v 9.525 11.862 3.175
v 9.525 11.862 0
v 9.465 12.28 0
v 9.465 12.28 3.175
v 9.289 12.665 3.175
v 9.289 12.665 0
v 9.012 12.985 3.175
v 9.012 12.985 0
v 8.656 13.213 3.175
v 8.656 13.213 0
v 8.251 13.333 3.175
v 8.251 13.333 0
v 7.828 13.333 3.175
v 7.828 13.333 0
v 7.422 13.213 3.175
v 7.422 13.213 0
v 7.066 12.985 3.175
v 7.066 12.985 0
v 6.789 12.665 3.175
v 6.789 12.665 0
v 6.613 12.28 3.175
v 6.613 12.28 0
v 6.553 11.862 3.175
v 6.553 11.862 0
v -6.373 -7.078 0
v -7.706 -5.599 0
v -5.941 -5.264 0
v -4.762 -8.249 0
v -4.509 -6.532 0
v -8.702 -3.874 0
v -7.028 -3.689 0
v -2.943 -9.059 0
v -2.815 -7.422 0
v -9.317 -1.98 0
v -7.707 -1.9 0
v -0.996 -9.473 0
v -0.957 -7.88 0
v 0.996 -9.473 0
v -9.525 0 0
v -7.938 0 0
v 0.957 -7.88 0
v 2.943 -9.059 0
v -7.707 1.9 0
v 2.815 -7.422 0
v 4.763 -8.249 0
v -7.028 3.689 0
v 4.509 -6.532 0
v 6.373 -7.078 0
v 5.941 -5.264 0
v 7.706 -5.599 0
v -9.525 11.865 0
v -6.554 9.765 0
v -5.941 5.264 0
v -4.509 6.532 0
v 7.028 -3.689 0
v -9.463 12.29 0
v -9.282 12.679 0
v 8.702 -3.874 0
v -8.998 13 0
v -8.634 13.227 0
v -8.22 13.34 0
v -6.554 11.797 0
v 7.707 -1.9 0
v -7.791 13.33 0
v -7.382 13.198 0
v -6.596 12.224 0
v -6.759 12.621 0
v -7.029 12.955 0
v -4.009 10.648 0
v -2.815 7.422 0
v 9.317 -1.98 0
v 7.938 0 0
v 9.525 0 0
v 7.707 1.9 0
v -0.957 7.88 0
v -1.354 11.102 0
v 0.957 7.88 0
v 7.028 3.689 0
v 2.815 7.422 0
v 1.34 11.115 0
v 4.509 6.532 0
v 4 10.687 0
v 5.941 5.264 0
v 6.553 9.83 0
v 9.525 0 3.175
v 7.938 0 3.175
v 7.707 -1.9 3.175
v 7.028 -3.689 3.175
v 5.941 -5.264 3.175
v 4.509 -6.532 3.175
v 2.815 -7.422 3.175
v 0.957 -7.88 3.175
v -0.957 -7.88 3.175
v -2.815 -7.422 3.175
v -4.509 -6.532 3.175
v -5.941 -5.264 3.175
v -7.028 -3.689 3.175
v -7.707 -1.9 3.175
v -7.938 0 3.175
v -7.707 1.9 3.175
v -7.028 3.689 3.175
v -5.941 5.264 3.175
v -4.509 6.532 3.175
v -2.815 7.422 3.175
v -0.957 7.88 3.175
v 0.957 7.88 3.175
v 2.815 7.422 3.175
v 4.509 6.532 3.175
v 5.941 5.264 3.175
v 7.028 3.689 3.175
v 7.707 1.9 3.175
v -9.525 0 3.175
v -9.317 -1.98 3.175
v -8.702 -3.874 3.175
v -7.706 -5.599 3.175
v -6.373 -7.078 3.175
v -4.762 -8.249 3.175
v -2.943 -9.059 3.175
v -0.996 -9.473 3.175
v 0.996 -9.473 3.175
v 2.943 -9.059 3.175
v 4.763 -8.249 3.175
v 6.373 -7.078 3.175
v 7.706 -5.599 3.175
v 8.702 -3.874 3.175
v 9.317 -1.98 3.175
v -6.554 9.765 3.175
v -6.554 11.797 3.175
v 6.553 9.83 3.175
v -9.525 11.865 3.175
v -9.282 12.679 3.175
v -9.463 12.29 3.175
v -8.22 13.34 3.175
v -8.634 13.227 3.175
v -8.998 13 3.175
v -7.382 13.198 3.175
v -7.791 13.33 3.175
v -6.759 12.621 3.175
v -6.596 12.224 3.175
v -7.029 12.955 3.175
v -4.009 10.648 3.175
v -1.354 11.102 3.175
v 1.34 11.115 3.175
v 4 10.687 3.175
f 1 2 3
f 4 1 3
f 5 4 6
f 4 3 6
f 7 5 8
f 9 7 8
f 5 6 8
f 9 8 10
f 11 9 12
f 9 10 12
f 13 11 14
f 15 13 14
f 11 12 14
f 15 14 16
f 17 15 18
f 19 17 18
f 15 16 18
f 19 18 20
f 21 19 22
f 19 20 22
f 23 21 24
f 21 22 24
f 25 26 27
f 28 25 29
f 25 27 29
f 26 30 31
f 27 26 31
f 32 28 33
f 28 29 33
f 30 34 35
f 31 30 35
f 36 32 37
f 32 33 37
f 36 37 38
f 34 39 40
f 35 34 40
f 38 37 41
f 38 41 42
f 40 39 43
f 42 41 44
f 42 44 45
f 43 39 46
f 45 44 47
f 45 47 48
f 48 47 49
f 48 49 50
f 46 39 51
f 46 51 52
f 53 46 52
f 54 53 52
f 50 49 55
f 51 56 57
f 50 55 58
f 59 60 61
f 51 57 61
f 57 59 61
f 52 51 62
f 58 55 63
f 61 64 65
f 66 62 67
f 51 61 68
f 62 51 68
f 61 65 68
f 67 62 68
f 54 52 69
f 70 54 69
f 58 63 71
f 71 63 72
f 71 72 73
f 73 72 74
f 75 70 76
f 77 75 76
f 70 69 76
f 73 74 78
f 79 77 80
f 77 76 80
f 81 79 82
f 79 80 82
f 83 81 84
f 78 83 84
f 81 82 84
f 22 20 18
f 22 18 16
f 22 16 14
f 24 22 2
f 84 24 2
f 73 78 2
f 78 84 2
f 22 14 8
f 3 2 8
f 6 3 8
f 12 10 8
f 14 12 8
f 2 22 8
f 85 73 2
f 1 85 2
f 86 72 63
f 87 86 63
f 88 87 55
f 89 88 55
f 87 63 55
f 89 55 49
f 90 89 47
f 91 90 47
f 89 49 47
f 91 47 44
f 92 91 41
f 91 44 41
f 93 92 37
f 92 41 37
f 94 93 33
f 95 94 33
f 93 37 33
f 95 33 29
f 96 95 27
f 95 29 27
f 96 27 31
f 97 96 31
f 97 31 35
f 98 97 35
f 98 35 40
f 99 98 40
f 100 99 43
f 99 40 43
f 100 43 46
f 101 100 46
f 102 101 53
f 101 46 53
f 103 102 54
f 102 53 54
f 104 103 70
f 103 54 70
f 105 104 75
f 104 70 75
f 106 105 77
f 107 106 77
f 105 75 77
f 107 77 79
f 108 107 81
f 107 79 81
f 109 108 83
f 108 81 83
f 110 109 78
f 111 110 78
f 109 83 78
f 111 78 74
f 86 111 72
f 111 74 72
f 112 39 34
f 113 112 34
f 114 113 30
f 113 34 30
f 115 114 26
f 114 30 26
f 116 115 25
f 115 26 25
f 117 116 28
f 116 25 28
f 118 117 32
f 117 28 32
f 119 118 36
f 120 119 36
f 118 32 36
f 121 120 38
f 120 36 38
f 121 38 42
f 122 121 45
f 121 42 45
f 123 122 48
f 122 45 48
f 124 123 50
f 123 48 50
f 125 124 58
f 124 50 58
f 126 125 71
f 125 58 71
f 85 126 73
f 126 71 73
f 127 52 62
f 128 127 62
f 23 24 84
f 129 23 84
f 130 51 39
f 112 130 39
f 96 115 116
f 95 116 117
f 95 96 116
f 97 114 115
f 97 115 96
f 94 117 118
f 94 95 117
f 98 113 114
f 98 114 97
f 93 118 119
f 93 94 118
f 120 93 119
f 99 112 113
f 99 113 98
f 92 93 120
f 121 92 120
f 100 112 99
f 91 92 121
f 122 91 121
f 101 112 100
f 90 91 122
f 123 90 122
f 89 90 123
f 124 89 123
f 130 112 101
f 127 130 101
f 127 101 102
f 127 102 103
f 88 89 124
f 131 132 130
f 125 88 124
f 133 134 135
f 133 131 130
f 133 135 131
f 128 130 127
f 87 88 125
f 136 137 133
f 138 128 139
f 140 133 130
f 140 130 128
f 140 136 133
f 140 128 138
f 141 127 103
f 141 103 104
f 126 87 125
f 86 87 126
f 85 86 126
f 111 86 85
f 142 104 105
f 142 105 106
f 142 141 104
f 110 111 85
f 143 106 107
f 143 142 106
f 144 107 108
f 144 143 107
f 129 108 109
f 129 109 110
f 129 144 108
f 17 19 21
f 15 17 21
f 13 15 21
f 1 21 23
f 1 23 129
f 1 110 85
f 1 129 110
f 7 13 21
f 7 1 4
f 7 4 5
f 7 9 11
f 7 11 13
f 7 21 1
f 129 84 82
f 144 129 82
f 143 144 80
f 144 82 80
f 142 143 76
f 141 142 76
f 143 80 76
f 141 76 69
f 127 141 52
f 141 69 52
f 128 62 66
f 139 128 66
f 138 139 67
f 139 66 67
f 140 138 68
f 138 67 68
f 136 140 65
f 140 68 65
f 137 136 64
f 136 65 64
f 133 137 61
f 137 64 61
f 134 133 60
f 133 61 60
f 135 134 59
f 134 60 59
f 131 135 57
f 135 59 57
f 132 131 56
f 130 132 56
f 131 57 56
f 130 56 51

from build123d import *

# Parameters (mm, degrees)
F1_DEPTH = 3.175


with BuildPart() as f1:
    # F0 (on Top) → F1 (new body)
    with BuildSketch(Plane.XY):
        with BuildLine():
            ThreePointArc((9.525, 0), (0, 9.525), (-9.525, 0))
            ThreePointArc((-9.525, 0), (0, -9.525), (9.525, 0))
        make_face()
        with BuildLine():
            ThreePointArc((-7.9375, 0), (0, 7.9375), (7.9375, 0))
            ThreePointArc((7.9375, 0), (0, -7.9375), (-7.9375, 0))
        make_face(mode=Mode.SUBTRACT)
        with BuildLine():
            Line((-9.525, 11.865028), (-9.525, 0))
            ThreePointArc((-9.525, 0), (0, 9.525), (9.525, 0))
            Line((9.525, 0), (9.525, 11.8618))
            Line((9.525, 11.8618), (6.5532, 11.8618))
            Line((6.5532, 11.8618), (6.5532, 9.8298))
            ThreePointArc((6.5532, 9.8298), (-0.007139, 11.163698), (-6.553978, 9.765045))
            Line((-6.553978, 9.765045), (-6.553978, 11.797045))
            Line((-6.553978, 11.797045), (-9.525, 11.865028))
        make_face()
        with BuildLine():
            ThreePointArc((-6.553978, 11.797045), (-8.00471, 13.350928), (-9.525, 11.865028))
            Line((-9.525, 11.865028), (-6.553978, 11.797045))
        make_face()
        with BuildLine():
            Line((6.5532, 11.8618), (9.525, 11.8618))
            ThreePointArc((9.525, 11.8618), (8.0391, 13.3477), (6.5532, 11.8618))
        make_face()
    extrude(amount=F1_DEPTH)


solid = f1.part
